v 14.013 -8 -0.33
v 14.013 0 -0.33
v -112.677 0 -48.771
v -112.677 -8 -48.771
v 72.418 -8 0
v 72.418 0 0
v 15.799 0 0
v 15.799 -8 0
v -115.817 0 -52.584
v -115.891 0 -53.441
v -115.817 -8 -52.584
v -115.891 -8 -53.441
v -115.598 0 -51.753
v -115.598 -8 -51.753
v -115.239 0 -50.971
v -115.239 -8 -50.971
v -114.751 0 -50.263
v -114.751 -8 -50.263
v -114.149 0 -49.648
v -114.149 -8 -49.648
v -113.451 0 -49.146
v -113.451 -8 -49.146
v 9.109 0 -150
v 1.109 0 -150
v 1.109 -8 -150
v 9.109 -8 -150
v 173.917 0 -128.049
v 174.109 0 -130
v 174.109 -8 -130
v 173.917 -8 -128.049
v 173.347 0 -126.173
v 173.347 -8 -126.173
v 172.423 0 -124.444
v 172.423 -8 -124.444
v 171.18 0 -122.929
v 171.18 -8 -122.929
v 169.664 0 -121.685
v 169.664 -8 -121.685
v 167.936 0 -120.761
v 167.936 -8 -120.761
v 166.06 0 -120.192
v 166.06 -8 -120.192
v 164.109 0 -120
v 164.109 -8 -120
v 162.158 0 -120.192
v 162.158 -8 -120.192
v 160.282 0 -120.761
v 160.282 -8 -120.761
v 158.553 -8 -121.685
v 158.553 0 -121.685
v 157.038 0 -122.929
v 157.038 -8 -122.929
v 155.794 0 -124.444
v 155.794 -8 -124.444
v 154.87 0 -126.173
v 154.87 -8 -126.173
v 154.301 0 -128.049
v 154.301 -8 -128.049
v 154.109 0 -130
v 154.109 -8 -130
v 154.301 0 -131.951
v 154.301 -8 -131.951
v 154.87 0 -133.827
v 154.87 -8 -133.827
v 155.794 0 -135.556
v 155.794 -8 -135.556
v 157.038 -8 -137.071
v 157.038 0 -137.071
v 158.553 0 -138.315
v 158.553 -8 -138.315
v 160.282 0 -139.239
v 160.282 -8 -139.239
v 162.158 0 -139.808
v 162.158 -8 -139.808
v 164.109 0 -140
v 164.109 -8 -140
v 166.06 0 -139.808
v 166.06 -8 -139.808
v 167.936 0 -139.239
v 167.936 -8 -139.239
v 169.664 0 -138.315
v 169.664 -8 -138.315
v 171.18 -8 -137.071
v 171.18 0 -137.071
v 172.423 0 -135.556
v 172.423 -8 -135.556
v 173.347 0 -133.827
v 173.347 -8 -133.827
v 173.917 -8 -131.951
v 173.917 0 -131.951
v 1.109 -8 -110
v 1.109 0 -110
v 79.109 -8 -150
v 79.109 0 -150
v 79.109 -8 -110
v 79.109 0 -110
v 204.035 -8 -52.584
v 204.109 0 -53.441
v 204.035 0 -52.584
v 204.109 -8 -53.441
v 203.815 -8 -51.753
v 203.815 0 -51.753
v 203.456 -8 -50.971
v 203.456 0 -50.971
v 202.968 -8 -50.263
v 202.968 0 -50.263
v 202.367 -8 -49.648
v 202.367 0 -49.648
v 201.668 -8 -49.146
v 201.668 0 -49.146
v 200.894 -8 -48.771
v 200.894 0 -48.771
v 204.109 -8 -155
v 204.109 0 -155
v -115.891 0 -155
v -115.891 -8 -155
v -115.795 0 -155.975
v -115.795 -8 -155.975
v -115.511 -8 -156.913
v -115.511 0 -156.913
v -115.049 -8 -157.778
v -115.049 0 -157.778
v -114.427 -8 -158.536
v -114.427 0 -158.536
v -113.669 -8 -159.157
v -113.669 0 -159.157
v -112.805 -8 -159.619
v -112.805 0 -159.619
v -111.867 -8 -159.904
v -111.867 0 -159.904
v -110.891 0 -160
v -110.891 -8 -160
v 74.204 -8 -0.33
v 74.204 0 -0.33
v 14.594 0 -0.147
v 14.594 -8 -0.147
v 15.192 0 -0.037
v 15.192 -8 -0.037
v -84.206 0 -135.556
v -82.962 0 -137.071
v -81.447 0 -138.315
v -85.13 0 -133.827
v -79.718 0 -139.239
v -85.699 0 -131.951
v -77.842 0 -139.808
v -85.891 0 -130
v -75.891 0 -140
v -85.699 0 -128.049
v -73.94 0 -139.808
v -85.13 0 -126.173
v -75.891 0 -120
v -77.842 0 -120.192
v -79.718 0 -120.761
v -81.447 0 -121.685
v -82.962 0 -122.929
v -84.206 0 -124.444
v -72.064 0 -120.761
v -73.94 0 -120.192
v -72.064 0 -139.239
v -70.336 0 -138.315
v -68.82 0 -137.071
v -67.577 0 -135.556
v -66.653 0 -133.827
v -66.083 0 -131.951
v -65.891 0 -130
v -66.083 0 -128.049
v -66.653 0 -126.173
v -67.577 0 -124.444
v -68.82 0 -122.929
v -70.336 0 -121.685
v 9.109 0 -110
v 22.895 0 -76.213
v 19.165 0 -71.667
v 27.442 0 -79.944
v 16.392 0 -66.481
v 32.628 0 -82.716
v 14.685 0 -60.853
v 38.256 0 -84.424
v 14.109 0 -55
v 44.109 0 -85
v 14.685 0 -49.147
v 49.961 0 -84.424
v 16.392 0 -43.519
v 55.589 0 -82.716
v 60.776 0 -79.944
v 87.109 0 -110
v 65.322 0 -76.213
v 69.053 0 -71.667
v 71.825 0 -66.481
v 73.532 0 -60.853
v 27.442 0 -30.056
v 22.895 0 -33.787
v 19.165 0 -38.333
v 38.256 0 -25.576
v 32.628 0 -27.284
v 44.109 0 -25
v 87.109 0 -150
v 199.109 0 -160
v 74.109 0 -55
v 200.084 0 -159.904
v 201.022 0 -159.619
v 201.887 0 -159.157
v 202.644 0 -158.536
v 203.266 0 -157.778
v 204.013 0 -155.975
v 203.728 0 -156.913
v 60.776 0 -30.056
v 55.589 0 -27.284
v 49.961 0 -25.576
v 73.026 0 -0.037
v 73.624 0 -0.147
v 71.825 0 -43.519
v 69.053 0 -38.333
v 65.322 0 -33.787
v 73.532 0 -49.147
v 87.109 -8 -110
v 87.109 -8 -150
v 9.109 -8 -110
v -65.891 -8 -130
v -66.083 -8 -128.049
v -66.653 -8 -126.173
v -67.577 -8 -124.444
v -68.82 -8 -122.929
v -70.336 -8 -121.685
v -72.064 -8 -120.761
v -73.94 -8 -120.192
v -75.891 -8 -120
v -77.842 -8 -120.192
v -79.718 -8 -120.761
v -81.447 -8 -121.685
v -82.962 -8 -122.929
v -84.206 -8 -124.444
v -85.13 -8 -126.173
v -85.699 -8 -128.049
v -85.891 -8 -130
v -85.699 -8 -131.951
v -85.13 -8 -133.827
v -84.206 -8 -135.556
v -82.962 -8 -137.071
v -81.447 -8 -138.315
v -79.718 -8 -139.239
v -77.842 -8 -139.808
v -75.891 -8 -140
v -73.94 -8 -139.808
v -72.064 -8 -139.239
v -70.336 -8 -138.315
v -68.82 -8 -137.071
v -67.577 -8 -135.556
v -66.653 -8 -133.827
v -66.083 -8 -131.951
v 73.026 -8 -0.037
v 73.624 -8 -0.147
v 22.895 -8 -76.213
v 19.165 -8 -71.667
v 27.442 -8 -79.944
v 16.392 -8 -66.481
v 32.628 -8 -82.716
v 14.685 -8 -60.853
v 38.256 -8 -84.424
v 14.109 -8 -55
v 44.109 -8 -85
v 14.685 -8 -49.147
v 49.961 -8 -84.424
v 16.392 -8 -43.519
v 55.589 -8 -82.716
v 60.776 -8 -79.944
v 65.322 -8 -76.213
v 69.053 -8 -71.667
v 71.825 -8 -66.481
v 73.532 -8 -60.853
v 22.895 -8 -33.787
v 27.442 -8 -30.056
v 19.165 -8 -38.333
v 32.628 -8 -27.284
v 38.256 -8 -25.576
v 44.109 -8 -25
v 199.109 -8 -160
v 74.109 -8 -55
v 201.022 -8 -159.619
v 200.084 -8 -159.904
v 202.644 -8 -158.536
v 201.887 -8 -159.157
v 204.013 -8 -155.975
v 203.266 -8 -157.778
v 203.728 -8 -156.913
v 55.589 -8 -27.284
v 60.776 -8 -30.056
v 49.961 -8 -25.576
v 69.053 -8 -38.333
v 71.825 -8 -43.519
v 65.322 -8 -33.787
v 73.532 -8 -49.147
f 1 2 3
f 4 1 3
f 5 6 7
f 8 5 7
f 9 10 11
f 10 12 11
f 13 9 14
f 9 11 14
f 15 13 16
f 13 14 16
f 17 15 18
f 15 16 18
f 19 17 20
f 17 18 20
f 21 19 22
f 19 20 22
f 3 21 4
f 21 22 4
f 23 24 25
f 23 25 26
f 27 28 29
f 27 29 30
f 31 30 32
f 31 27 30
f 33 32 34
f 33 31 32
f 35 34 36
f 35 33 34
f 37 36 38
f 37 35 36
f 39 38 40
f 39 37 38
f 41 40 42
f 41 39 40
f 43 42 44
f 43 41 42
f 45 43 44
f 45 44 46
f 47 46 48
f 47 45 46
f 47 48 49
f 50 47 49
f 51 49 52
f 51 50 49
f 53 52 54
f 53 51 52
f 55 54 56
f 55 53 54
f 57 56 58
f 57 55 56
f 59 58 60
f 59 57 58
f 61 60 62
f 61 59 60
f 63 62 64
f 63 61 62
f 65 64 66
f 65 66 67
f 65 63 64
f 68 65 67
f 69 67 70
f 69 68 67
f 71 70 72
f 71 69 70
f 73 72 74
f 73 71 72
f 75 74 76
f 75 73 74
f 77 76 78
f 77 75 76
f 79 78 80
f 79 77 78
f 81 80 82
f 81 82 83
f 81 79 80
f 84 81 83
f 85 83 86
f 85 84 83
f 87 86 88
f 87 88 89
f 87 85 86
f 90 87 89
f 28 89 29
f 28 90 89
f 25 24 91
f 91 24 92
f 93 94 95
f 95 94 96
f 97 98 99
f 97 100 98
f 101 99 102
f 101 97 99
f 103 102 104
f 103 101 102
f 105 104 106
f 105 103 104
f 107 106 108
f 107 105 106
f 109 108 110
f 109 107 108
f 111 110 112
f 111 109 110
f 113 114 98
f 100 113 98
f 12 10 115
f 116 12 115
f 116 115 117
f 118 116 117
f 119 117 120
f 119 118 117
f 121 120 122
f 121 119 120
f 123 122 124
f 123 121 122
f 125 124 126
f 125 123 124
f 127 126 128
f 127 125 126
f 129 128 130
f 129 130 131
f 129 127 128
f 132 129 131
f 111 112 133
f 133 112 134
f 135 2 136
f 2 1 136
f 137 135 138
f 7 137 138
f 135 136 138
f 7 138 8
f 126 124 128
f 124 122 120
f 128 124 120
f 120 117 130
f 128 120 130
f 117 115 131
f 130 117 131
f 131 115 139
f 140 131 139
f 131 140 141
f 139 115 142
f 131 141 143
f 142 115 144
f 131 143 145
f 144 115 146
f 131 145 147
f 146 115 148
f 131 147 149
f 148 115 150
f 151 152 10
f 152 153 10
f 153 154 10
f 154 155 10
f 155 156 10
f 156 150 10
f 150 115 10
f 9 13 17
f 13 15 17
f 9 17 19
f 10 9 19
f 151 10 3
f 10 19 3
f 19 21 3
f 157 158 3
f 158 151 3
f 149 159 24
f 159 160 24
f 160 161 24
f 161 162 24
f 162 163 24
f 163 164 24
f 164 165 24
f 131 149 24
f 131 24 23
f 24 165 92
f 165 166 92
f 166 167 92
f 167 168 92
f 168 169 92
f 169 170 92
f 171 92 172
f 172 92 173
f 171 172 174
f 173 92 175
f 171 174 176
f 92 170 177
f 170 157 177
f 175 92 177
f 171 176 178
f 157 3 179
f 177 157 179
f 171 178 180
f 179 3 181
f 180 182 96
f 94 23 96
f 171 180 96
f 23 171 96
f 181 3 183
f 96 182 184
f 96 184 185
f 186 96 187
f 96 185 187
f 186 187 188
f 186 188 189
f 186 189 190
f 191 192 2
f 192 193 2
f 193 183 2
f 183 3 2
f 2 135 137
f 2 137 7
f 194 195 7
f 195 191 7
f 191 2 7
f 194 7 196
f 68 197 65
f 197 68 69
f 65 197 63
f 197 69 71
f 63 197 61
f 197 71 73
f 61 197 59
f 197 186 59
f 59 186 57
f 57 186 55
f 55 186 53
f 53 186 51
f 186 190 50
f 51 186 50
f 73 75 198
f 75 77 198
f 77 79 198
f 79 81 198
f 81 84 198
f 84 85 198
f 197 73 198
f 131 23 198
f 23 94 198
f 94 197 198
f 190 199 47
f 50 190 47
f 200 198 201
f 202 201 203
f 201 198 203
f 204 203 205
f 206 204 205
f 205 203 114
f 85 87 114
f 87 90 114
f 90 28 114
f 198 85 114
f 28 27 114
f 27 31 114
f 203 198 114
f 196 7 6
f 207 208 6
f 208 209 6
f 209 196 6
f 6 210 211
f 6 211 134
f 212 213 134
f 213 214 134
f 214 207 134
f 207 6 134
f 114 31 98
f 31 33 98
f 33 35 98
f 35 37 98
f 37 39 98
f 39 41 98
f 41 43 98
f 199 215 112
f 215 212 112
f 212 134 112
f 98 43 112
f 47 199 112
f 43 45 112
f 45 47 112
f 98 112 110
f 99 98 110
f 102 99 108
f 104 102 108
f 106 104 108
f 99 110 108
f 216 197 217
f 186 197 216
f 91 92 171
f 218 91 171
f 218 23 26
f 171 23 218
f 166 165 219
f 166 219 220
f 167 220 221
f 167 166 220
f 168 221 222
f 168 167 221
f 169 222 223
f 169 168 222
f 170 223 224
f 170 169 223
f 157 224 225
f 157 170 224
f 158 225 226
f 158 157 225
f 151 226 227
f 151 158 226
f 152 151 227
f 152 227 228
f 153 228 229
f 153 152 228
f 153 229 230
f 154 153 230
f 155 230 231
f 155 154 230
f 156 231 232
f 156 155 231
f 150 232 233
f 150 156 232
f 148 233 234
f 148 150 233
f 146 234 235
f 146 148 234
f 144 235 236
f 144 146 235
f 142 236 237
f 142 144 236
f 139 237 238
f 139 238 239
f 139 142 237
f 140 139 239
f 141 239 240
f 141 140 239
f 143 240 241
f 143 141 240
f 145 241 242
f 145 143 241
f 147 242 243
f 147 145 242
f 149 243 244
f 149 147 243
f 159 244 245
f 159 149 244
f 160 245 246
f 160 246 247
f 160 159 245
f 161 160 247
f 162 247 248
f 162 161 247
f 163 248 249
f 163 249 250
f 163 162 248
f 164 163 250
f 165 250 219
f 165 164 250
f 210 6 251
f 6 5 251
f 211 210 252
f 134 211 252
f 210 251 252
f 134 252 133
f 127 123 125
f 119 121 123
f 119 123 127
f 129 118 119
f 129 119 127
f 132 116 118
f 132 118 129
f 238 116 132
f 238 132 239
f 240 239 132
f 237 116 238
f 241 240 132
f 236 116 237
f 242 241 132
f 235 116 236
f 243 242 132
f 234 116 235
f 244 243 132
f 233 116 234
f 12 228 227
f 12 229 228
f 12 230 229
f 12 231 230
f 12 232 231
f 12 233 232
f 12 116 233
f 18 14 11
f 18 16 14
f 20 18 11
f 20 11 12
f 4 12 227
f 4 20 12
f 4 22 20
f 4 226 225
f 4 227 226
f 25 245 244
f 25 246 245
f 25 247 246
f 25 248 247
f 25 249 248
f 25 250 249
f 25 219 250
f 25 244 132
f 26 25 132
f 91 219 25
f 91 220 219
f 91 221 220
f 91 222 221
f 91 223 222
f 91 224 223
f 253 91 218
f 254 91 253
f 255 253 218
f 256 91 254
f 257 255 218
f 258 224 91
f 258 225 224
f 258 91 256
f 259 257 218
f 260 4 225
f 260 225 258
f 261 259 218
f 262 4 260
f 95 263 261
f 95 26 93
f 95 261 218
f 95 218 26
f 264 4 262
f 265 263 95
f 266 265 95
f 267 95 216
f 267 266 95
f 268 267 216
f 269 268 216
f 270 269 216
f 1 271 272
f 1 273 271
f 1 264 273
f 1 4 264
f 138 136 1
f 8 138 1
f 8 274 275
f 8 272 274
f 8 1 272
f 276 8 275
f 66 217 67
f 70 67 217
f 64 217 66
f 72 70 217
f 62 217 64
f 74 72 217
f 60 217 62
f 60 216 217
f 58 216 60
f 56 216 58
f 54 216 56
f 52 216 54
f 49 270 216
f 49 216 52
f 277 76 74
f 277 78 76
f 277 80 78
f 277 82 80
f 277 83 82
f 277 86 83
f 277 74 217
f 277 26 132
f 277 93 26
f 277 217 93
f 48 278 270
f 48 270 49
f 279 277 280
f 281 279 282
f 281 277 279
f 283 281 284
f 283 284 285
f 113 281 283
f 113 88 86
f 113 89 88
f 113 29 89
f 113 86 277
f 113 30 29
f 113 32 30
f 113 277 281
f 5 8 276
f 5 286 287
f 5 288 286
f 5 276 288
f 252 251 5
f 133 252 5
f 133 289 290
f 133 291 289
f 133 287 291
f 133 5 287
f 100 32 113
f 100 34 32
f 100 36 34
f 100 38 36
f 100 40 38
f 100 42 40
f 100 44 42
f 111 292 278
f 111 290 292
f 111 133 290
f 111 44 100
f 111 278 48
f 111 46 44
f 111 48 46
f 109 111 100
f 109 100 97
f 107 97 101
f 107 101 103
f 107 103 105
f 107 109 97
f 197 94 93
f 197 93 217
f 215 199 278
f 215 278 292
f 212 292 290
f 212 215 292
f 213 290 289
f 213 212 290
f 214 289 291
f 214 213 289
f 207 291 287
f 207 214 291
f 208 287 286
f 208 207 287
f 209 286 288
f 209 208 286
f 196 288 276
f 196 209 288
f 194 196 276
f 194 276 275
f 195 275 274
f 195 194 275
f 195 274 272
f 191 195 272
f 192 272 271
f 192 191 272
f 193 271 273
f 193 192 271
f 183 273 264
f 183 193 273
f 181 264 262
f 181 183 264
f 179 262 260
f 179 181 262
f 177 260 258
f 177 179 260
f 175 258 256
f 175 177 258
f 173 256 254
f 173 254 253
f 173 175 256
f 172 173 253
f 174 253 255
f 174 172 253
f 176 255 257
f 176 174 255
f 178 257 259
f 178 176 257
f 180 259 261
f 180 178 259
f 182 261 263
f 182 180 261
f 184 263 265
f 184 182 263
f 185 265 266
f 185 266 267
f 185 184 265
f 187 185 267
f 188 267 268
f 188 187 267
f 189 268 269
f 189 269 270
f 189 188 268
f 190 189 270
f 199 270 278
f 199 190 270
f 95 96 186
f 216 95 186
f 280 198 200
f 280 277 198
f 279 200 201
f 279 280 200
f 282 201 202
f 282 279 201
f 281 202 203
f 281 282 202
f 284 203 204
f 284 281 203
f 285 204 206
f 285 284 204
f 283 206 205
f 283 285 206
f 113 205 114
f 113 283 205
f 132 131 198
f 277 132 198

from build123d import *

# Parameters (mm, degrees)
F0_R     = 10
F0_W     = 8
F0_H     = 40
F0_R_2   = 30
F1_DEPTH = 8
F2_R     = 5


with BuildPart() as f1:
    # F0 (on Front) → F1 (new body)
    with BuildSketch(Plane.XZ):
        Polygon((-115.891304, -50), (-115.891304, -160), (204.108696, -160), (204.108696, -50), (73.341727, 0), (14.875664, 0), align=None)
        with Locations((-75.891304, -130)):
            Circle(F0_R, mode=Mode.SUBTRACT)
        with Locations((5.108696, -130)):
            Rectangle(F0_W, F0_H, mode=Mode.SUBTRACT)
        with Locations((83.108696, -130)):
            Rectangle(F0_W, F0_H, mode=Mode.SUBTRACT)
        with Locations((164.108696, -130)):
            Circle(F0_R, mode=Mode.SUBTRACT)
        with Locations((44.108696, -55)):
            Circle(F0_R_2, mode=Mode.SUBTRACT)
    extrude(amount=F1_DEPTH)

    # F2
    f2_edges = [f1.edges().sort_by_distance(p)[0] for p in [
        (-115.891304, -4, -50),
        (14.875664, -4, 0),
        (204.108696, -4, -50),
        (204.108696, -4, -160),
        (-115.891304, -4, -160),
        (73.341727, -4, 0),
    ]]
    fillet(f2_edges, radius=F2_R)


solid = f1.part
